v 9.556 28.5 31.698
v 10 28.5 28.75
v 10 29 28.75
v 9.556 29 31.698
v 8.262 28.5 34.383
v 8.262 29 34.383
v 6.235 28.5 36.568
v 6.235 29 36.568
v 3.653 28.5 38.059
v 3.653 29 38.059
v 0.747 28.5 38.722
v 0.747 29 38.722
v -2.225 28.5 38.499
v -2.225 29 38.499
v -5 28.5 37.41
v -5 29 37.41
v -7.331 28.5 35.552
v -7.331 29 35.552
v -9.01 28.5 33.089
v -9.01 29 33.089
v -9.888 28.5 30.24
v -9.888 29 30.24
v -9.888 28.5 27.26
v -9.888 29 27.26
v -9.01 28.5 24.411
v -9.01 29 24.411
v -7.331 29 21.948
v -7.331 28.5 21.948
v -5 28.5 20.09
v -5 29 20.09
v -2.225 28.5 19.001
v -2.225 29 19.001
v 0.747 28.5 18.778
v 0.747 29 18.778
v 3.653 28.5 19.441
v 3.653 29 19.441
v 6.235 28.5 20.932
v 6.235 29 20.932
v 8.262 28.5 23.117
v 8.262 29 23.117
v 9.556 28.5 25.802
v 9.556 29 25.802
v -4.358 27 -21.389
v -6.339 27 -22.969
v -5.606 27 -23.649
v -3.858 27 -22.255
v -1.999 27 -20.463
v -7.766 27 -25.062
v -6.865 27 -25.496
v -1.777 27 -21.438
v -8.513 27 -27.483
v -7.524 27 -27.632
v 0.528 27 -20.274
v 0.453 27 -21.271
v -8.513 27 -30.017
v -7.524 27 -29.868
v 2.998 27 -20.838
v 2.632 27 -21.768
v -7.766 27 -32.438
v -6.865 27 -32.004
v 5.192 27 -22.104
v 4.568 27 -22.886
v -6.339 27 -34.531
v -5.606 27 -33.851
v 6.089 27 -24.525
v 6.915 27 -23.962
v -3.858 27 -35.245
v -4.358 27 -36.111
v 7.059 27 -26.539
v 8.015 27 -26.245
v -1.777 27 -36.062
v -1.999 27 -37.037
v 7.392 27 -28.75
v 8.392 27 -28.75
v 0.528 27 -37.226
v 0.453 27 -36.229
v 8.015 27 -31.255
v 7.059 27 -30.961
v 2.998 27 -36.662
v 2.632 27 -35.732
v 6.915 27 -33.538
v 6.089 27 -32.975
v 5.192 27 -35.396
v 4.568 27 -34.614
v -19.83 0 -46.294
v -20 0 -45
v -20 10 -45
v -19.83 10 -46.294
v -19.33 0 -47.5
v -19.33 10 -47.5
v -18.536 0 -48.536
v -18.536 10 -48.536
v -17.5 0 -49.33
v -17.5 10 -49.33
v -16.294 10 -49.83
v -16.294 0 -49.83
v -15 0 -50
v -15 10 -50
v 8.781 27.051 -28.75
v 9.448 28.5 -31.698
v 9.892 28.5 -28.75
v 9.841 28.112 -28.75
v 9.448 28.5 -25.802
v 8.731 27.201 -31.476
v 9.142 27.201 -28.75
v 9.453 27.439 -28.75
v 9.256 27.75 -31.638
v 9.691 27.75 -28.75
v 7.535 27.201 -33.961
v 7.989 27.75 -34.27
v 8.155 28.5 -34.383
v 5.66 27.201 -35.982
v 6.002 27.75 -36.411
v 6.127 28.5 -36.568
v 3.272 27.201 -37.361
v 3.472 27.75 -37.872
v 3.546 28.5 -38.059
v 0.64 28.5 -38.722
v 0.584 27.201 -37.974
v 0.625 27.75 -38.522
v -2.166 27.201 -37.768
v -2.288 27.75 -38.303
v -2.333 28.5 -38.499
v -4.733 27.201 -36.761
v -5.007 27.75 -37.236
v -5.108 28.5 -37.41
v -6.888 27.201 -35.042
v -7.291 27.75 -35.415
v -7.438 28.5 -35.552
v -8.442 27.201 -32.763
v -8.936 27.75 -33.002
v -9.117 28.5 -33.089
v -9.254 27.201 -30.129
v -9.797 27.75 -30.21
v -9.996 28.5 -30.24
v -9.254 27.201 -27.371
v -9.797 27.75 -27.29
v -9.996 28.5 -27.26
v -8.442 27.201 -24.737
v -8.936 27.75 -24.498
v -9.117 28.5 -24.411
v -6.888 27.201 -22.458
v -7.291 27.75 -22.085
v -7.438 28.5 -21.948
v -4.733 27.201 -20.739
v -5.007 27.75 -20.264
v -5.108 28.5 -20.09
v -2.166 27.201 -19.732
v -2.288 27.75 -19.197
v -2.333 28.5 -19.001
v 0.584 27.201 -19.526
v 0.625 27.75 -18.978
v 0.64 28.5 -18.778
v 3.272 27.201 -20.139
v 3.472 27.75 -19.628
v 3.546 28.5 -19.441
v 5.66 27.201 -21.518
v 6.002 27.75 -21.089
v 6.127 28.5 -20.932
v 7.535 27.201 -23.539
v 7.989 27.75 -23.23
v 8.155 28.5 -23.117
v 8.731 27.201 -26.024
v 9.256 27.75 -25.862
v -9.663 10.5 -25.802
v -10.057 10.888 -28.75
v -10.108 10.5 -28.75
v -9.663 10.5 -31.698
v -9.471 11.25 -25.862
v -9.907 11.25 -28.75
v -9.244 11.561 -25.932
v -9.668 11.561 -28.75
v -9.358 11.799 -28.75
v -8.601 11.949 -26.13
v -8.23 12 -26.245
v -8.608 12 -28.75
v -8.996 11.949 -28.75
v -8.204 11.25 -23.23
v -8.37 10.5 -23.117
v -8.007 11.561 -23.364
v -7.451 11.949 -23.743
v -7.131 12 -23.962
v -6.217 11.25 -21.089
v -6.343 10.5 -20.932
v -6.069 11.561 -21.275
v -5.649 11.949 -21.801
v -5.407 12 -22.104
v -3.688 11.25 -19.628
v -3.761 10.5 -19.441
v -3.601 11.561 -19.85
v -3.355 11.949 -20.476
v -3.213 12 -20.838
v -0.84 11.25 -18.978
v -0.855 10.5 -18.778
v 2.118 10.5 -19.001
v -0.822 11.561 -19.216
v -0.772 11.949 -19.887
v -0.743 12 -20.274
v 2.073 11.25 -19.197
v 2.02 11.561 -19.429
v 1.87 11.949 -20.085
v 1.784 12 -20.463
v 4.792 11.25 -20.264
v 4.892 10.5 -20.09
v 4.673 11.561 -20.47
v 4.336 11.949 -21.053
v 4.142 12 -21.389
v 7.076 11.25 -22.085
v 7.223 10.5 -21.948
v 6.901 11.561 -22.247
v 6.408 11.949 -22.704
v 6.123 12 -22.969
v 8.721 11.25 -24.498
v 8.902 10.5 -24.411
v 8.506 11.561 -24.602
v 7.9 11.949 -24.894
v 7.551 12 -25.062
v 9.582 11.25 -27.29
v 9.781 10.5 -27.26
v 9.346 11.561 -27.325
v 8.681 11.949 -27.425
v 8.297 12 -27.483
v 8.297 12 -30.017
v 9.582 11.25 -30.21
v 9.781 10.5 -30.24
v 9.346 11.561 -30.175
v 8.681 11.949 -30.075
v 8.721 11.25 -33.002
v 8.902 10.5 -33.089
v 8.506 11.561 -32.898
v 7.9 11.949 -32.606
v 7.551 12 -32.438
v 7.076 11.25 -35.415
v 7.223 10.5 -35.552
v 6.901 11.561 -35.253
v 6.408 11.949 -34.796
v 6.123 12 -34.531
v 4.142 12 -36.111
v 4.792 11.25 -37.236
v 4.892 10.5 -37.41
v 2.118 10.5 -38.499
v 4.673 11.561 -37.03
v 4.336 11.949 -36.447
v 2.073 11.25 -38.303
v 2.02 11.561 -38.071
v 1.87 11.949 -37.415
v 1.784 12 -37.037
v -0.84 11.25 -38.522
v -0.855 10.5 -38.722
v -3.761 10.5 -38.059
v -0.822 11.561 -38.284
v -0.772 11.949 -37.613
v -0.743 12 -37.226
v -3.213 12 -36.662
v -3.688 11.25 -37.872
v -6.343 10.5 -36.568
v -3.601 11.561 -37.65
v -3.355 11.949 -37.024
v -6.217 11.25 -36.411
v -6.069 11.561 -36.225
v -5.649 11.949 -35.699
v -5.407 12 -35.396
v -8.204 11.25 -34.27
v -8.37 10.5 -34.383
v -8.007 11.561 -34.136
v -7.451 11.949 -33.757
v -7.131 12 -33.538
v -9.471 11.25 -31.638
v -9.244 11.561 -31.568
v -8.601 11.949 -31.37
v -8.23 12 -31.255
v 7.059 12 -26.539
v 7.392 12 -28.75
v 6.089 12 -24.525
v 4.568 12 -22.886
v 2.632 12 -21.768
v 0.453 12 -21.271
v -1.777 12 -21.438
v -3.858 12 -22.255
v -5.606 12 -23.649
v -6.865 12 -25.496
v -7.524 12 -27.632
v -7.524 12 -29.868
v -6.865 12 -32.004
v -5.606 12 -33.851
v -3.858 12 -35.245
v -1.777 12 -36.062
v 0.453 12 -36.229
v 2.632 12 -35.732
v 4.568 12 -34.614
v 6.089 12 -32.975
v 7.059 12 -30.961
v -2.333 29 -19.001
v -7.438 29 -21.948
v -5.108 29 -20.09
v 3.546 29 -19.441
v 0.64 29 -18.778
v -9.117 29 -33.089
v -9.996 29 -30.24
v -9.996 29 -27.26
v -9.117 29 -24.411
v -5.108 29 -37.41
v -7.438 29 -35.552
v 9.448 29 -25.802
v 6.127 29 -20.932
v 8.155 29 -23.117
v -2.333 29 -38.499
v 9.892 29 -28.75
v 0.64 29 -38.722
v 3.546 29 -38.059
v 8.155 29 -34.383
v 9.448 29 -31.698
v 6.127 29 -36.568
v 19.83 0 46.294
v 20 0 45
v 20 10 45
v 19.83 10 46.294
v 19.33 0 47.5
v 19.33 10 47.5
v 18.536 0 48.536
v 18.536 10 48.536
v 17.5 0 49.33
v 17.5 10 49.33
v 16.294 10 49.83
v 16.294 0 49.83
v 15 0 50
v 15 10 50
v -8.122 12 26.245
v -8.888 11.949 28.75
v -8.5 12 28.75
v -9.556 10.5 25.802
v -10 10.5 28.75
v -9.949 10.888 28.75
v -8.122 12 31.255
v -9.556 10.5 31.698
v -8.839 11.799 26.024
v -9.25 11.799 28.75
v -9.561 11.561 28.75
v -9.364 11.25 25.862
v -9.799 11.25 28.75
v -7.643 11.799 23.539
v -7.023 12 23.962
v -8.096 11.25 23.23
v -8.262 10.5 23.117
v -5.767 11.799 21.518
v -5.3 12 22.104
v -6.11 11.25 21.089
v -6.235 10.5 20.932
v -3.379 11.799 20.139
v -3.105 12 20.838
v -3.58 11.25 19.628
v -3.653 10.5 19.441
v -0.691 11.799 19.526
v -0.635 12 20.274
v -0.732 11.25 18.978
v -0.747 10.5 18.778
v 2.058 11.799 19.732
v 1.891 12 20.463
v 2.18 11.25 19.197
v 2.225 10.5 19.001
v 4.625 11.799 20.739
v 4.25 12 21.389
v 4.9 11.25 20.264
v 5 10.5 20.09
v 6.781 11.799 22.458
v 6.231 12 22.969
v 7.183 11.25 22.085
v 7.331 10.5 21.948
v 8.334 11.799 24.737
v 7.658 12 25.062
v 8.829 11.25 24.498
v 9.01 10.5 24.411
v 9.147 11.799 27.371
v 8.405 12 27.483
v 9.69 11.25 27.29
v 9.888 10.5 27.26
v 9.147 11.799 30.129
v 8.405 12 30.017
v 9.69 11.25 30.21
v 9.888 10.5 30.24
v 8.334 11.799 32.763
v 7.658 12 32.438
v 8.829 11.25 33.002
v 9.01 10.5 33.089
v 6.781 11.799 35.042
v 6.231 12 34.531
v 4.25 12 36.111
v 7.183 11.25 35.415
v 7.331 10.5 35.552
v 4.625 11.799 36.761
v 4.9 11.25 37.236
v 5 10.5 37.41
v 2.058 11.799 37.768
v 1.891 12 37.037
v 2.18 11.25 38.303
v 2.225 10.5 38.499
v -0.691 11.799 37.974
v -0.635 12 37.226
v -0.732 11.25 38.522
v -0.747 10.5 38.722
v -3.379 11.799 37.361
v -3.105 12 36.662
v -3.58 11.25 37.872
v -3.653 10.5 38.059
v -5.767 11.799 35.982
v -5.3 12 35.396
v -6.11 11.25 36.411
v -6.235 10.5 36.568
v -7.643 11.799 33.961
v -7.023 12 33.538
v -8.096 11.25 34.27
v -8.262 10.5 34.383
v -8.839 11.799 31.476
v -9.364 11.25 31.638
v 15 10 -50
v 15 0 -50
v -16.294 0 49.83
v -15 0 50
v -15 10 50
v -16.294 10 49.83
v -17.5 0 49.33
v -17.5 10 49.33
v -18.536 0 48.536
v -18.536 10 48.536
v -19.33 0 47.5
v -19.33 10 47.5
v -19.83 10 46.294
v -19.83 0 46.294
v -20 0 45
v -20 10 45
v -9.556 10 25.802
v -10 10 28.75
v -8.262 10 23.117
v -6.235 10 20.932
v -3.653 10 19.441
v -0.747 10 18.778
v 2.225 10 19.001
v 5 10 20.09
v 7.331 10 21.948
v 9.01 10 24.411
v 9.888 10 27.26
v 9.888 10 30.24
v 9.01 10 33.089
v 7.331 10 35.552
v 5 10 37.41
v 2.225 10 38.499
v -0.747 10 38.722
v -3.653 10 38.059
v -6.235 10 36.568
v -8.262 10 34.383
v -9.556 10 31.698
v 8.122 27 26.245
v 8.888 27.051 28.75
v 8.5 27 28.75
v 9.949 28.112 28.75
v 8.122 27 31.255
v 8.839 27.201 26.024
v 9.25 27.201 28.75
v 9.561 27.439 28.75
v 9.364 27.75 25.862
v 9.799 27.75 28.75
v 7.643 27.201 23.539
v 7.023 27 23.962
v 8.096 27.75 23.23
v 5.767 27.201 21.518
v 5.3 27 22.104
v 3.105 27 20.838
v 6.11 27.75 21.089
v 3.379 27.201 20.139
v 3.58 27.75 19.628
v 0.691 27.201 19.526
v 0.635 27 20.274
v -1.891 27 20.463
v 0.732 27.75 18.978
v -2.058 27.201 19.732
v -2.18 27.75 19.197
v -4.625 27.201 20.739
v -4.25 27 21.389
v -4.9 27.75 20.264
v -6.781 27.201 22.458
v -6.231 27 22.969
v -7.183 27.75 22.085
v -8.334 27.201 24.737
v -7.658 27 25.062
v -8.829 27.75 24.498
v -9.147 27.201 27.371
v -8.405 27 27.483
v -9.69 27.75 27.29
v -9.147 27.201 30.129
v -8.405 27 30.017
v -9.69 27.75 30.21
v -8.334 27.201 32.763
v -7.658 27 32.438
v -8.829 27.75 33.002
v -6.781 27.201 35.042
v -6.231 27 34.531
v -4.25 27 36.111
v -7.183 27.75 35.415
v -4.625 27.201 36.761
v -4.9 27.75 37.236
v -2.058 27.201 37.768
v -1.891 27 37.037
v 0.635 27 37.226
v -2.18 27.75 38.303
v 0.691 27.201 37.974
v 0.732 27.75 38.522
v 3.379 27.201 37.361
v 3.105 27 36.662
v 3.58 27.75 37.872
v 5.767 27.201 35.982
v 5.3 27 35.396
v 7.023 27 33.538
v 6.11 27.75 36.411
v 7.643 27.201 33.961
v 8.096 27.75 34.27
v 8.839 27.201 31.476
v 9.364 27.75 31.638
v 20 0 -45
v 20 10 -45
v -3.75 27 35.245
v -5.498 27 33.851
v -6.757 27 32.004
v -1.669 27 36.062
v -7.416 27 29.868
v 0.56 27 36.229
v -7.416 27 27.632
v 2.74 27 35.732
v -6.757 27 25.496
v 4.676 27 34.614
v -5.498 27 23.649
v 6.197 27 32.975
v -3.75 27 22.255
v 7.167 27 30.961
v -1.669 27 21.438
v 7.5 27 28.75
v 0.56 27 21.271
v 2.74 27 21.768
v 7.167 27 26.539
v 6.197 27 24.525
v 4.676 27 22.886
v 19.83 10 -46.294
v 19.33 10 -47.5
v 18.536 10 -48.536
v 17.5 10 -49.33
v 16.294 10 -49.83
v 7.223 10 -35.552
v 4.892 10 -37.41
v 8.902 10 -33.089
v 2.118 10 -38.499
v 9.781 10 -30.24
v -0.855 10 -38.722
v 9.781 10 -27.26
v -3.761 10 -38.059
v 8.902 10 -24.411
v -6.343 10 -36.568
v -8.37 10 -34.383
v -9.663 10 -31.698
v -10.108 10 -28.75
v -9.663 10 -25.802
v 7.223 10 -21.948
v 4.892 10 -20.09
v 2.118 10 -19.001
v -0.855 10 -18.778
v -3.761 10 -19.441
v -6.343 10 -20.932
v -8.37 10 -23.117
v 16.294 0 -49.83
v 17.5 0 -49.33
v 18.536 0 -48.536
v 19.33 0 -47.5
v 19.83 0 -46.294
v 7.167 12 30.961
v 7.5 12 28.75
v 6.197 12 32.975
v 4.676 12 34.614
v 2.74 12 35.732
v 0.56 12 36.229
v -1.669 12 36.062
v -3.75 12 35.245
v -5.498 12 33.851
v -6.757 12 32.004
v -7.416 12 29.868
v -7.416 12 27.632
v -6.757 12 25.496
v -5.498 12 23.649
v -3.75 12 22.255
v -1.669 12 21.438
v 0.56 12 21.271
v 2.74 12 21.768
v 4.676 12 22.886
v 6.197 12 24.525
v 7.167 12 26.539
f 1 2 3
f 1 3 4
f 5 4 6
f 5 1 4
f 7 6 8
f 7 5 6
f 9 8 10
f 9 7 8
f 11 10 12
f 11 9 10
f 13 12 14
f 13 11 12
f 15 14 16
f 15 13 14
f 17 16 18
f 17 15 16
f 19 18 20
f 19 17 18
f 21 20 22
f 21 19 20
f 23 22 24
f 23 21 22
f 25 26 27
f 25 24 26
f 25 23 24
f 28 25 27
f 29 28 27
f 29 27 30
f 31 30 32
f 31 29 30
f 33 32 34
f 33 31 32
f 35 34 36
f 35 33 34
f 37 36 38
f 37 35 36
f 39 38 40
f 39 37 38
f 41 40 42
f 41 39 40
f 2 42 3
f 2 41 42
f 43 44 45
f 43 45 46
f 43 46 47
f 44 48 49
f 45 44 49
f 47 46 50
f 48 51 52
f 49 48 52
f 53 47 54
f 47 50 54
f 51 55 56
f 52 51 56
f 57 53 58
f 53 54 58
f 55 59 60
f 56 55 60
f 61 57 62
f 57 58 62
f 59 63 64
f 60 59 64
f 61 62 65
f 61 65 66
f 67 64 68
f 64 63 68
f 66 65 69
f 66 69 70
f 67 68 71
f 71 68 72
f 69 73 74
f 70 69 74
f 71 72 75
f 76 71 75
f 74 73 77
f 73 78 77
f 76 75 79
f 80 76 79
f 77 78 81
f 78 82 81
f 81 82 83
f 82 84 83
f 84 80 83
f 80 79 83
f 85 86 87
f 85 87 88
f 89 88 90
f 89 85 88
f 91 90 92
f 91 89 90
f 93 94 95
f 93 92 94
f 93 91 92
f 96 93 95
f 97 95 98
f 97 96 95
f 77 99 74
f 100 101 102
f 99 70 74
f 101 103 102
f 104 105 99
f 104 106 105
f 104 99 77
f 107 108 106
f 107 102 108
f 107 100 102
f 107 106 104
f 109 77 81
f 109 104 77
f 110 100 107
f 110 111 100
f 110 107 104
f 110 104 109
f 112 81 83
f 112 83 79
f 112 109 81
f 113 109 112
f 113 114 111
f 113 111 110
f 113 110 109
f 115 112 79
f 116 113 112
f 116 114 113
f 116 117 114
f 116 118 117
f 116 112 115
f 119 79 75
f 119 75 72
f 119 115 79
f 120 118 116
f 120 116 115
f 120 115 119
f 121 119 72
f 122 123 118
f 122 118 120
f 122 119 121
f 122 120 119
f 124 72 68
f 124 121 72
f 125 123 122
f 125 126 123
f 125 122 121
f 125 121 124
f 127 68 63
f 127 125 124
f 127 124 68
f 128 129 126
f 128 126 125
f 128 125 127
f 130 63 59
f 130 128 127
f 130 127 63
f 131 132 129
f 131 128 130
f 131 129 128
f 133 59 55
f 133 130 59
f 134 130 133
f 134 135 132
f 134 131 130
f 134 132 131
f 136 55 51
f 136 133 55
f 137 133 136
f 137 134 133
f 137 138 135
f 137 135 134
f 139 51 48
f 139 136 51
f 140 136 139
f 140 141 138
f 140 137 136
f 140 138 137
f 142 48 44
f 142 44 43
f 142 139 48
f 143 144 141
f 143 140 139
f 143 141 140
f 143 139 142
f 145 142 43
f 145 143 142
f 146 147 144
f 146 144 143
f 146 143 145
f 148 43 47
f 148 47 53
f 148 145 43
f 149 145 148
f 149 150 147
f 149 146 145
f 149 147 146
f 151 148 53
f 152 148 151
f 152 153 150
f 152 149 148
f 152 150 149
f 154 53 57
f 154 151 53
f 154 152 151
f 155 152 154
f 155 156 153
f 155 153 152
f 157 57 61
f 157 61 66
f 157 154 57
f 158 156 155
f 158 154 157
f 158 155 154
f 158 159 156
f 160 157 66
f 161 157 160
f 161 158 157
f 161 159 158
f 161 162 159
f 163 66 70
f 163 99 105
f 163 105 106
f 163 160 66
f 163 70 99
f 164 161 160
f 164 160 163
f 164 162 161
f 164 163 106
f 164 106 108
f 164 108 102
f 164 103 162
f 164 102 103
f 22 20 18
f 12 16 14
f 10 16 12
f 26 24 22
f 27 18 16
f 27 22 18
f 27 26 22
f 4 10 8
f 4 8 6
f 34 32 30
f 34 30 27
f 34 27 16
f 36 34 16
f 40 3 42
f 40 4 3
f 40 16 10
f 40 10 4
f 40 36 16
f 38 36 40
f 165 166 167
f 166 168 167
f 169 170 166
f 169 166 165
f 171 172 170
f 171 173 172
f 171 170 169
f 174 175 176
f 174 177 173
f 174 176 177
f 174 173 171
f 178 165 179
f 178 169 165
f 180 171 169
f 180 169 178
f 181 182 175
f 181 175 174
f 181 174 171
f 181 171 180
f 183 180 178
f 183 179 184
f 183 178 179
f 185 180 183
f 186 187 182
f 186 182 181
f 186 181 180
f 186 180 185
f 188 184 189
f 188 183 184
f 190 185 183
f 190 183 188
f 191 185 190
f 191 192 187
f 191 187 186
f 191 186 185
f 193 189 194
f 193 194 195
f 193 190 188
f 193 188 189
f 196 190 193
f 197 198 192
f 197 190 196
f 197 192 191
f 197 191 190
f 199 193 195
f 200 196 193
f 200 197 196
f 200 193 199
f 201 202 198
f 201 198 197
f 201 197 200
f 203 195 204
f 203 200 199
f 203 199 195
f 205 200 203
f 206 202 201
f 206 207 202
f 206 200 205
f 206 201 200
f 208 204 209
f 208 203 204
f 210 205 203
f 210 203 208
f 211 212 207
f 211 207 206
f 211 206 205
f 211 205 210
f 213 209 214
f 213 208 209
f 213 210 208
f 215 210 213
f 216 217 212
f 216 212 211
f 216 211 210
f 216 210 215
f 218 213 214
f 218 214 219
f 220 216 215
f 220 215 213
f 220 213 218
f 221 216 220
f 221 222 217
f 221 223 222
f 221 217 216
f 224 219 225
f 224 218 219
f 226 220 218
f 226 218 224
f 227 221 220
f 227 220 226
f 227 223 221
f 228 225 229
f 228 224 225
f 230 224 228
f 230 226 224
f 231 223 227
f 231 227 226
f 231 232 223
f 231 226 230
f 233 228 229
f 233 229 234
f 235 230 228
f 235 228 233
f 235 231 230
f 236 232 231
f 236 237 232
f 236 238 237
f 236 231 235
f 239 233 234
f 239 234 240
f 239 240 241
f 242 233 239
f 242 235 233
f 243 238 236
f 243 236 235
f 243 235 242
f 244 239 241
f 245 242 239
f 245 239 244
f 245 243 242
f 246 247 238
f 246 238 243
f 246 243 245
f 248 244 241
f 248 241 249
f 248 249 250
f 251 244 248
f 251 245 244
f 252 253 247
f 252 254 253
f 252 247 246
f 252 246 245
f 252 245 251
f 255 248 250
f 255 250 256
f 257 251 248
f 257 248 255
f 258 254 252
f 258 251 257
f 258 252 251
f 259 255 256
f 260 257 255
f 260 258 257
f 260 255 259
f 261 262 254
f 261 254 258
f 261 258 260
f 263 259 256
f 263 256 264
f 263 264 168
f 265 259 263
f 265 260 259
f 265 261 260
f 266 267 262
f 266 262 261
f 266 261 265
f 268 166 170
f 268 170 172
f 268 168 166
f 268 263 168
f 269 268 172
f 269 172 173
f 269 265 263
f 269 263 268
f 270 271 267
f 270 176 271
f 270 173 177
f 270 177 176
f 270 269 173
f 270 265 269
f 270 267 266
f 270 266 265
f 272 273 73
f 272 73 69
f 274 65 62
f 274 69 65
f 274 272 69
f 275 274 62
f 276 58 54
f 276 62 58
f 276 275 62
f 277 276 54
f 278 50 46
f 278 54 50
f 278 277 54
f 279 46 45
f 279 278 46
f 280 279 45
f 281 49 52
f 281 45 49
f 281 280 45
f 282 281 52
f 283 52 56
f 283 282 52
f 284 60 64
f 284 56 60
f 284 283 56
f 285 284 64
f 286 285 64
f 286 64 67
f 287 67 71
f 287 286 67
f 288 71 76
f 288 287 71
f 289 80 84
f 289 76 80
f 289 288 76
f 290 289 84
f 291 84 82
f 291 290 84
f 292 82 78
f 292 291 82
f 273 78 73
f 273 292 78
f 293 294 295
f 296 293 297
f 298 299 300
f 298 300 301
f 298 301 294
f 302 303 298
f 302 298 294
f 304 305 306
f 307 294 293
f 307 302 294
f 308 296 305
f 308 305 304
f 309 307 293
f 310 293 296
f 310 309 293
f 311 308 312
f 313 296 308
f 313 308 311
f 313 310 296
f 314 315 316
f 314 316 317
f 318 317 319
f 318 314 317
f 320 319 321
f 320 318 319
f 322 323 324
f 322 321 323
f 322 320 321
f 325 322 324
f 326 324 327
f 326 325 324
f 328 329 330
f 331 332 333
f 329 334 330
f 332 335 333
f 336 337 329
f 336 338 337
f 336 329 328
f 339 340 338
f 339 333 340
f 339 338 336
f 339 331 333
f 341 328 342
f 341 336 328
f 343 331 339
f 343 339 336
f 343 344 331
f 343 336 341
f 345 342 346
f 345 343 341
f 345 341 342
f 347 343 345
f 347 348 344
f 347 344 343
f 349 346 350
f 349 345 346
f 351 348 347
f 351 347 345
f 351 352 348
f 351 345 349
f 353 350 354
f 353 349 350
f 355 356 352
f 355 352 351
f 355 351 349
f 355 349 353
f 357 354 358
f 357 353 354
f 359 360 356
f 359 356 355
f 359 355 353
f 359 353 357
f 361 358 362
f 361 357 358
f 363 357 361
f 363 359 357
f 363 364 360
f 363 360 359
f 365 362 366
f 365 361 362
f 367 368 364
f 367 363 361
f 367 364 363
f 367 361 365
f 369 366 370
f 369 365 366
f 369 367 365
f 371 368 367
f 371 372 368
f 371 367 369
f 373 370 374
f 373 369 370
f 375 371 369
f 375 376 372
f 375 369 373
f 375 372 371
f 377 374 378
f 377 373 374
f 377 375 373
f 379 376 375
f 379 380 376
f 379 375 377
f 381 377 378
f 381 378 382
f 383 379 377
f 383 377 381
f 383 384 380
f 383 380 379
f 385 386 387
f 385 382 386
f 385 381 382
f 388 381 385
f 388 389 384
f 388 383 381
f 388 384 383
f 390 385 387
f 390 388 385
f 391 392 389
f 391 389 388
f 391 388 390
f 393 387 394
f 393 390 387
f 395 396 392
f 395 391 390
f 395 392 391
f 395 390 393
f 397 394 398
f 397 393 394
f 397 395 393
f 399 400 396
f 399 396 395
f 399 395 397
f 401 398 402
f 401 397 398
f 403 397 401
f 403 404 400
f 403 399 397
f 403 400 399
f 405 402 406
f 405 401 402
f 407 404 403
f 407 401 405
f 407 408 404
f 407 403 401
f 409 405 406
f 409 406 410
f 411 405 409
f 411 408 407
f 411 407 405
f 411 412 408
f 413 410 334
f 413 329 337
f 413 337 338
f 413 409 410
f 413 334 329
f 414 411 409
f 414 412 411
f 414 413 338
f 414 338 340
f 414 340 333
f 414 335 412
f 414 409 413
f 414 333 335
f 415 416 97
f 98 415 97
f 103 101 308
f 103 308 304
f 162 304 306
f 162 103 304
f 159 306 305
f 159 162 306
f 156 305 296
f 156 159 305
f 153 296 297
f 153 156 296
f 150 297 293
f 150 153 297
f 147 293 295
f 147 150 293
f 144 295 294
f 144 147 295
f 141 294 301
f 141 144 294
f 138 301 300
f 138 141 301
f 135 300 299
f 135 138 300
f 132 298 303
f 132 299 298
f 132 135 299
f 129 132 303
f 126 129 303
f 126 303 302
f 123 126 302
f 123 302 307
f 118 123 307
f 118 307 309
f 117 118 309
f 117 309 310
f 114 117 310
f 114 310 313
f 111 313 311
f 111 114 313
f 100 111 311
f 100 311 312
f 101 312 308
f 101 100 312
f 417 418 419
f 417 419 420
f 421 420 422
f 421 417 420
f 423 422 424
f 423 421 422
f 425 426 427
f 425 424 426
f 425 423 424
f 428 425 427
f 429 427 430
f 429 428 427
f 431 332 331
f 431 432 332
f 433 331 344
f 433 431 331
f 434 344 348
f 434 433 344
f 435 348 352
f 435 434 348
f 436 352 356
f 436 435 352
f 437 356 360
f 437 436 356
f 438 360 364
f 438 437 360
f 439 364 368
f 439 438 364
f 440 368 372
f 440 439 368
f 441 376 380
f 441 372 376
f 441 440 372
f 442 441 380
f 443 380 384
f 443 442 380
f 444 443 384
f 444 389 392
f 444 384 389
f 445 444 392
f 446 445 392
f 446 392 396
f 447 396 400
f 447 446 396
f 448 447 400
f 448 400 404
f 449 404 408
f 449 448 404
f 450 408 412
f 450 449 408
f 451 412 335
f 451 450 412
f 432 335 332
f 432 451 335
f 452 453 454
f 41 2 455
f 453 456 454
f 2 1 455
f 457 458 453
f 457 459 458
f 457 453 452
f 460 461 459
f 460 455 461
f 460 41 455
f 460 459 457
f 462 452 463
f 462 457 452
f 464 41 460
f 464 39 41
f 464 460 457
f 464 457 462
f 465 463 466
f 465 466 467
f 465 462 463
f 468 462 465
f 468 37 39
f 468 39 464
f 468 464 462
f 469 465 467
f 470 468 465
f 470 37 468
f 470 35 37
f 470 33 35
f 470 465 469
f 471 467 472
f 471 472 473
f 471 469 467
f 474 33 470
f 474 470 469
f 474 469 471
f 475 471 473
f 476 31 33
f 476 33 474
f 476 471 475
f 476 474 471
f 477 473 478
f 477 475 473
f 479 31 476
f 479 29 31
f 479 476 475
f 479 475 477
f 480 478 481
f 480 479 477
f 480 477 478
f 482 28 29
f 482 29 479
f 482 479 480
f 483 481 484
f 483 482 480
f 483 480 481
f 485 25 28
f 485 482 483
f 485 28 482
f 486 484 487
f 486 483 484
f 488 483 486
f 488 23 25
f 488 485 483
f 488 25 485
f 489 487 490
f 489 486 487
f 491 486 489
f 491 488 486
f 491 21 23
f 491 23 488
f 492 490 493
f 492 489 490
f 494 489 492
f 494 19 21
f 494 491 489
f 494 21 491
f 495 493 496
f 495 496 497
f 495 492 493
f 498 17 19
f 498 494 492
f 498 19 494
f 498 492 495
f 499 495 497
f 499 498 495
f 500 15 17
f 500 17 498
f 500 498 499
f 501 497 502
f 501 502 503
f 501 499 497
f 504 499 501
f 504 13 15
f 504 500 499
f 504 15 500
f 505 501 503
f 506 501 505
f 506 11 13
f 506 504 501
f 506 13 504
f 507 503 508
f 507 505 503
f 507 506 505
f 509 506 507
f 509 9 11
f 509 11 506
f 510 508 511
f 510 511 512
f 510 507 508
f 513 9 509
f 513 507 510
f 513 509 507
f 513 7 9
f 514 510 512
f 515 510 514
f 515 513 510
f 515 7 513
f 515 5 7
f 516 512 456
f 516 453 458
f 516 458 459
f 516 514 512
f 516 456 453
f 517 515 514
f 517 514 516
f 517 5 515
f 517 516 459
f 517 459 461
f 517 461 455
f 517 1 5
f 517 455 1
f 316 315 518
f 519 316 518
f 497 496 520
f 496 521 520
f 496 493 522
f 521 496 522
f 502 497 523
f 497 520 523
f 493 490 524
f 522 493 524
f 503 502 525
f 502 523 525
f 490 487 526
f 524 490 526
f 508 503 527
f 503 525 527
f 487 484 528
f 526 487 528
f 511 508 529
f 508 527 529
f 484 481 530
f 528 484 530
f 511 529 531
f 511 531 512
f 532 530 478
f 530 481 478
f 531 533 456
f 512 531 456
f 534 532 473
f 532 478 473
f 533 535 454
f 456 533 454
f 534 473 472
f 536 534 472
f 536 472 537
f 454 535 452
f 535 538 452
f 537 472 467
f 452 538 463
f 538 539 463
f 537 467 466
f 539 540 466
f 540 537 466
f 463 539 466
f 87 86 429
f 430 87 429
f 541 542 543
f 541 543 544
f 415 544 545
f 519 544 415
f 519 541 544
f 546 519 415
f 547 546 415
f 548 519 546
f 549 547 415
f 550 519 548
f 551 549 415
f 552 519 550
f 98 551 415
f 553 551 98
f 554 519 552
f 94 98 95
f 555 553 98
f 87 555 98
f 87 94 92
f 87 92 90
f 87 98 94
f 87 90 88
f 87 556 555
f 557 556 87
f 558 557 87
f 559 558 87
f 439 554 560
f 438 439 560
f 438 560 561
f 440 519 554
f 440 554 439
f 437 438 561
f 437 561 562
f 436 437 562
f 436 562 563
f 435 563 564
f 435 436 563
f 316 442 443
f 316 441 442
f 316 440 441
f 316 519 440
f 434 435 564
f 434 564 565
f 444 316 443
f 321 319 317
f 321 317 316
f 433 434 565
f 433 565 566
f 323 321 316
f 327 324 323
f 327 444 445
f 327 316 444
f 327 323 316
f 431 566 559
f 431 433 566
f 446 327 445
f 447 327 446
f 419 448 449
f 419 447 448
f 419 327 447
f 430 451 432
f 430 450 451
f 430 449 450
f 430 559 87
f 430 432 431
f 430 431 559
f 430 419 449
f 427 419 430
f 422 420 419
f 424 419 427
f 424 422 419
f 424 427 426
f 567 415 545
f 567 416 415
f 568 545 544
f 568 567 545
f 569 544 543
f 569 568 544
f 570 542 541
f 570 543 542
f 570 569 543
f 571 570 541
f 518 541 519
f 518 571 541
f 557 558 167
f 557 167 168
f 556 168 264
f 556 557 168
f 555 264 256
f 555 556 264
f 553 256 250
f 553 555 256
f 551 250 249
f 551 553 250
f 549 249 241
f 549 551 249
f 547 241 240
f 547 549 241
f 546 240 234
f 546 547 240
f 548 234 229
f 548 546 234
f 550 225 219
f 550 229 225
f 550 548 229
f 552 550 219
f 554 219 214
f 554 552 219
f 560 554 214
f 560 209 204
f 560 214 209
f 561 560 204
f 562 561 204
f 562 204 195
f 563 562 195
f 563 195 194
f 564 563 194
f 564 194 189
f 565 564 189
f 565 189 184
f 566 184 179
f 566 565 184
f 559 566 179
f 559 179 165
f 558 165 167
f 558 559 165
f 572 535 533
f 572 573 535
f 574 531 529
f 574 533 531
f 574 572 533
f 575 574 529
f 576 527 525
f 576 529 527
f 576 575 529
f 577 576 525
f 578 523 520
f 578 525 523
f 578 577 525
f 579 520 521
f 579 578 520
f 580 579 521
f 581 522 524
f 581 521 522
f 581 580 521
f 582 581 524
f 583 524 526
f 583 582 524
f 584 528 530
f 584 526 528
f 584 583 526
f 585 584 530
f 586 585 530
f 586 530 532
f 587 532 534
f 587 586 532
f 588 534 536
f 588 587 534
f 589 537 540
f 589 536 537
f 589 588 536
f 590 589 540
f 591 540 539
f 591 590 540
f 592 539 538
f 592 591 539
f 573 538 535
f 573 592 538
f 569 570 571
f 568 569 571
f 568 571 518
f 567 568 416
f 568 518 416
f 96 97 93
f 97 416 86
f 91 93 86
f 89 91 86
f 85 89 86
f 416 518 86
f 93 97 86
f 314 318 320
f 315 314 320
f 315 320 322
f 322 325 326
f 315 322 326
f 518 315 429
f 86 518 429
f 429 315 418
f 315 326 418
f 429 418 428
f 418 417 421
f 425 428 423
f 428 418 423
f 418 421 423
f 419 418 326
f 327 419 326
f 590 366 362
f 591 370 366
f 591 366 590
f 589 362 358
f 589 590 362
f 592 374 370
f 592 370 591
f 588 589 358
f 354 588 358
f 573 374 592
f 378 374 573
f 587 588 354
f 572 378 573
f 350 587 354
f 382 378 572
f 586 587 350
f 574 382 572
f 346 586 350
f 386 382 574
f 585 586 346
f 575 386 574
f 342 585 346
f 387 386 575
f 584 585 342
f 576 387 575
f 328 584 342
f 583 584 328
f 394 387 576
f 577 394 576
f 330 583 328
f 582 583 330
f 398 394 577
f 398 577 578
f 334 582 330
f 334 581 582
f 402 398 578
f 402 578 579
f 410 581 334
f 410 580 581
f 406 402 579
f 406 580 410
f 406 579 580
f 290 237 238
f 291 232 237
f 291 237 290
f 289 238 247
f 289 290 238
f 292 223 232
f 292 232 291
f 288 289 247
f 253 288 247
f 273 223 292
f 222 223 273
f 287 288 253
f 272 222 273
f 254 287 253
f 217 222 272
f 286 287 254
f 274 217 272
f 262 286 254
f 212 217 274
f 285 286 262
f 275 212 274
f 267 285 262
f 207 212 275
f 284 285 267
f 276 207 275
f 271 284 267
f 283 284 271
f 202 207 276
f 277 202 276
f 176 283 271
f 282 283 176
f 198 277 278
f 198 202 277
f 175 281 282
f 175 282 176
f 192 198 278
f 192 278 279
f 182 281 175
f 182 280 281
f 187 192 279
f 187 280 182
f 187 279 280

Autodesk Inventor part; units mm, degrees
ref_plane "YZ Plane" through (0, 0, 0) normal (1, 0, 0) x (0, 1, 0)
ref_plane "XZ Plane" through (0, 0, 0) normal (0, 1, 0) x (-1, 0, 0)
ref_plane "XY Plane" through (0, 0, 0) normal (0, 0, 1) x (1, 0, 0)
sketch "Boceto1" plane through (0, 0, 0) normal (0, 1, 0) x (-1, 0, 0)
  line L0 (-15, -50) -> (15, -50)
  line L1 (20, -45) -> (20, 45)
  line L2 (15, 50) -> (-15, 50)
  line L3 (-20, 45) -> (-20, -45)
  arc A0 (-15, 50) -> (-20, 45) centre (-15, 45) ccw
  arc A1 (-20, -45) -> (-15, -50) centre (-15, -45) ccw
  arc A2 (15, -50) -> (20, -45) centre (15, -45) ccw
  arc A3 (20, 45) -> (15, 50) centre (15, 45) ccw
  circle A4 centre (0, 28.75) radius 10
  circle A5 centre (0.1077, -28.75) radius 10
  point P0 (0, 0)
  dimension "d3" = 5
  dimension "d4" = 5
  dimension "d5" = 5
  dimension "d6" = 5
  dimension "d7" = 20
  dimension "d8" = 20
  dimension "d10" = 28.75
  dimension "d11" = 28.75
extrude "Extrusión1" add sketch "Boceto1" along normal blind 10
extrude "Extrusión2" add sketch "Boceto1" along normal blind 12 contours A4 | A5
sketch "Boceto2" plane through (0, 12, 28.75) normal (0, 1, 0) x (1, 0, 0)
  circle A0 centre (0, 0) radius 7.5
  circle A1 centre (-0.1077, 57.5) radius 7.5
  circle A2 centre (-0.1077, 57.5) radius 10 projected
  circle A3 centre (0, 0) radius 10 projected
  point P0 (0, 28.75)
  dimension "d16" = 15
  dimension "d17" = 15
  dimension "d26" = 2.5
extrude "Extrusión3" add sketch "Boceto2" along normal blind 15 contours A0 | A1
sketch "Boceto3" plane through (0, 27, 28.75) normal (0, 1, 0) x (1, 0, 0)
  circle A0 centre (0, 0) radius 7.5 projected
  circle A1 centre (0, 0) radius 10
  circle A2 centre (-0.1077, 57.5) radius 10
  circle A3 centre (-0.1077, 57.5) radius 10 projected
  point P0 (0, 28.75)
  dimension "d20" = 20
  dimension "d21" = 20
extrude "Extrusión4" add sketch "Boceto3" along normal blind 2 contours A0 | A1 | A2
fillet "Empalme1" radius 1.5 4 edges at (10, 12, 28.75) (-10, 27, 28.75) (9.8923, 12, -28.75) (-10.1077, 27, -28.75)
properties part number "Soporte Engrane"
